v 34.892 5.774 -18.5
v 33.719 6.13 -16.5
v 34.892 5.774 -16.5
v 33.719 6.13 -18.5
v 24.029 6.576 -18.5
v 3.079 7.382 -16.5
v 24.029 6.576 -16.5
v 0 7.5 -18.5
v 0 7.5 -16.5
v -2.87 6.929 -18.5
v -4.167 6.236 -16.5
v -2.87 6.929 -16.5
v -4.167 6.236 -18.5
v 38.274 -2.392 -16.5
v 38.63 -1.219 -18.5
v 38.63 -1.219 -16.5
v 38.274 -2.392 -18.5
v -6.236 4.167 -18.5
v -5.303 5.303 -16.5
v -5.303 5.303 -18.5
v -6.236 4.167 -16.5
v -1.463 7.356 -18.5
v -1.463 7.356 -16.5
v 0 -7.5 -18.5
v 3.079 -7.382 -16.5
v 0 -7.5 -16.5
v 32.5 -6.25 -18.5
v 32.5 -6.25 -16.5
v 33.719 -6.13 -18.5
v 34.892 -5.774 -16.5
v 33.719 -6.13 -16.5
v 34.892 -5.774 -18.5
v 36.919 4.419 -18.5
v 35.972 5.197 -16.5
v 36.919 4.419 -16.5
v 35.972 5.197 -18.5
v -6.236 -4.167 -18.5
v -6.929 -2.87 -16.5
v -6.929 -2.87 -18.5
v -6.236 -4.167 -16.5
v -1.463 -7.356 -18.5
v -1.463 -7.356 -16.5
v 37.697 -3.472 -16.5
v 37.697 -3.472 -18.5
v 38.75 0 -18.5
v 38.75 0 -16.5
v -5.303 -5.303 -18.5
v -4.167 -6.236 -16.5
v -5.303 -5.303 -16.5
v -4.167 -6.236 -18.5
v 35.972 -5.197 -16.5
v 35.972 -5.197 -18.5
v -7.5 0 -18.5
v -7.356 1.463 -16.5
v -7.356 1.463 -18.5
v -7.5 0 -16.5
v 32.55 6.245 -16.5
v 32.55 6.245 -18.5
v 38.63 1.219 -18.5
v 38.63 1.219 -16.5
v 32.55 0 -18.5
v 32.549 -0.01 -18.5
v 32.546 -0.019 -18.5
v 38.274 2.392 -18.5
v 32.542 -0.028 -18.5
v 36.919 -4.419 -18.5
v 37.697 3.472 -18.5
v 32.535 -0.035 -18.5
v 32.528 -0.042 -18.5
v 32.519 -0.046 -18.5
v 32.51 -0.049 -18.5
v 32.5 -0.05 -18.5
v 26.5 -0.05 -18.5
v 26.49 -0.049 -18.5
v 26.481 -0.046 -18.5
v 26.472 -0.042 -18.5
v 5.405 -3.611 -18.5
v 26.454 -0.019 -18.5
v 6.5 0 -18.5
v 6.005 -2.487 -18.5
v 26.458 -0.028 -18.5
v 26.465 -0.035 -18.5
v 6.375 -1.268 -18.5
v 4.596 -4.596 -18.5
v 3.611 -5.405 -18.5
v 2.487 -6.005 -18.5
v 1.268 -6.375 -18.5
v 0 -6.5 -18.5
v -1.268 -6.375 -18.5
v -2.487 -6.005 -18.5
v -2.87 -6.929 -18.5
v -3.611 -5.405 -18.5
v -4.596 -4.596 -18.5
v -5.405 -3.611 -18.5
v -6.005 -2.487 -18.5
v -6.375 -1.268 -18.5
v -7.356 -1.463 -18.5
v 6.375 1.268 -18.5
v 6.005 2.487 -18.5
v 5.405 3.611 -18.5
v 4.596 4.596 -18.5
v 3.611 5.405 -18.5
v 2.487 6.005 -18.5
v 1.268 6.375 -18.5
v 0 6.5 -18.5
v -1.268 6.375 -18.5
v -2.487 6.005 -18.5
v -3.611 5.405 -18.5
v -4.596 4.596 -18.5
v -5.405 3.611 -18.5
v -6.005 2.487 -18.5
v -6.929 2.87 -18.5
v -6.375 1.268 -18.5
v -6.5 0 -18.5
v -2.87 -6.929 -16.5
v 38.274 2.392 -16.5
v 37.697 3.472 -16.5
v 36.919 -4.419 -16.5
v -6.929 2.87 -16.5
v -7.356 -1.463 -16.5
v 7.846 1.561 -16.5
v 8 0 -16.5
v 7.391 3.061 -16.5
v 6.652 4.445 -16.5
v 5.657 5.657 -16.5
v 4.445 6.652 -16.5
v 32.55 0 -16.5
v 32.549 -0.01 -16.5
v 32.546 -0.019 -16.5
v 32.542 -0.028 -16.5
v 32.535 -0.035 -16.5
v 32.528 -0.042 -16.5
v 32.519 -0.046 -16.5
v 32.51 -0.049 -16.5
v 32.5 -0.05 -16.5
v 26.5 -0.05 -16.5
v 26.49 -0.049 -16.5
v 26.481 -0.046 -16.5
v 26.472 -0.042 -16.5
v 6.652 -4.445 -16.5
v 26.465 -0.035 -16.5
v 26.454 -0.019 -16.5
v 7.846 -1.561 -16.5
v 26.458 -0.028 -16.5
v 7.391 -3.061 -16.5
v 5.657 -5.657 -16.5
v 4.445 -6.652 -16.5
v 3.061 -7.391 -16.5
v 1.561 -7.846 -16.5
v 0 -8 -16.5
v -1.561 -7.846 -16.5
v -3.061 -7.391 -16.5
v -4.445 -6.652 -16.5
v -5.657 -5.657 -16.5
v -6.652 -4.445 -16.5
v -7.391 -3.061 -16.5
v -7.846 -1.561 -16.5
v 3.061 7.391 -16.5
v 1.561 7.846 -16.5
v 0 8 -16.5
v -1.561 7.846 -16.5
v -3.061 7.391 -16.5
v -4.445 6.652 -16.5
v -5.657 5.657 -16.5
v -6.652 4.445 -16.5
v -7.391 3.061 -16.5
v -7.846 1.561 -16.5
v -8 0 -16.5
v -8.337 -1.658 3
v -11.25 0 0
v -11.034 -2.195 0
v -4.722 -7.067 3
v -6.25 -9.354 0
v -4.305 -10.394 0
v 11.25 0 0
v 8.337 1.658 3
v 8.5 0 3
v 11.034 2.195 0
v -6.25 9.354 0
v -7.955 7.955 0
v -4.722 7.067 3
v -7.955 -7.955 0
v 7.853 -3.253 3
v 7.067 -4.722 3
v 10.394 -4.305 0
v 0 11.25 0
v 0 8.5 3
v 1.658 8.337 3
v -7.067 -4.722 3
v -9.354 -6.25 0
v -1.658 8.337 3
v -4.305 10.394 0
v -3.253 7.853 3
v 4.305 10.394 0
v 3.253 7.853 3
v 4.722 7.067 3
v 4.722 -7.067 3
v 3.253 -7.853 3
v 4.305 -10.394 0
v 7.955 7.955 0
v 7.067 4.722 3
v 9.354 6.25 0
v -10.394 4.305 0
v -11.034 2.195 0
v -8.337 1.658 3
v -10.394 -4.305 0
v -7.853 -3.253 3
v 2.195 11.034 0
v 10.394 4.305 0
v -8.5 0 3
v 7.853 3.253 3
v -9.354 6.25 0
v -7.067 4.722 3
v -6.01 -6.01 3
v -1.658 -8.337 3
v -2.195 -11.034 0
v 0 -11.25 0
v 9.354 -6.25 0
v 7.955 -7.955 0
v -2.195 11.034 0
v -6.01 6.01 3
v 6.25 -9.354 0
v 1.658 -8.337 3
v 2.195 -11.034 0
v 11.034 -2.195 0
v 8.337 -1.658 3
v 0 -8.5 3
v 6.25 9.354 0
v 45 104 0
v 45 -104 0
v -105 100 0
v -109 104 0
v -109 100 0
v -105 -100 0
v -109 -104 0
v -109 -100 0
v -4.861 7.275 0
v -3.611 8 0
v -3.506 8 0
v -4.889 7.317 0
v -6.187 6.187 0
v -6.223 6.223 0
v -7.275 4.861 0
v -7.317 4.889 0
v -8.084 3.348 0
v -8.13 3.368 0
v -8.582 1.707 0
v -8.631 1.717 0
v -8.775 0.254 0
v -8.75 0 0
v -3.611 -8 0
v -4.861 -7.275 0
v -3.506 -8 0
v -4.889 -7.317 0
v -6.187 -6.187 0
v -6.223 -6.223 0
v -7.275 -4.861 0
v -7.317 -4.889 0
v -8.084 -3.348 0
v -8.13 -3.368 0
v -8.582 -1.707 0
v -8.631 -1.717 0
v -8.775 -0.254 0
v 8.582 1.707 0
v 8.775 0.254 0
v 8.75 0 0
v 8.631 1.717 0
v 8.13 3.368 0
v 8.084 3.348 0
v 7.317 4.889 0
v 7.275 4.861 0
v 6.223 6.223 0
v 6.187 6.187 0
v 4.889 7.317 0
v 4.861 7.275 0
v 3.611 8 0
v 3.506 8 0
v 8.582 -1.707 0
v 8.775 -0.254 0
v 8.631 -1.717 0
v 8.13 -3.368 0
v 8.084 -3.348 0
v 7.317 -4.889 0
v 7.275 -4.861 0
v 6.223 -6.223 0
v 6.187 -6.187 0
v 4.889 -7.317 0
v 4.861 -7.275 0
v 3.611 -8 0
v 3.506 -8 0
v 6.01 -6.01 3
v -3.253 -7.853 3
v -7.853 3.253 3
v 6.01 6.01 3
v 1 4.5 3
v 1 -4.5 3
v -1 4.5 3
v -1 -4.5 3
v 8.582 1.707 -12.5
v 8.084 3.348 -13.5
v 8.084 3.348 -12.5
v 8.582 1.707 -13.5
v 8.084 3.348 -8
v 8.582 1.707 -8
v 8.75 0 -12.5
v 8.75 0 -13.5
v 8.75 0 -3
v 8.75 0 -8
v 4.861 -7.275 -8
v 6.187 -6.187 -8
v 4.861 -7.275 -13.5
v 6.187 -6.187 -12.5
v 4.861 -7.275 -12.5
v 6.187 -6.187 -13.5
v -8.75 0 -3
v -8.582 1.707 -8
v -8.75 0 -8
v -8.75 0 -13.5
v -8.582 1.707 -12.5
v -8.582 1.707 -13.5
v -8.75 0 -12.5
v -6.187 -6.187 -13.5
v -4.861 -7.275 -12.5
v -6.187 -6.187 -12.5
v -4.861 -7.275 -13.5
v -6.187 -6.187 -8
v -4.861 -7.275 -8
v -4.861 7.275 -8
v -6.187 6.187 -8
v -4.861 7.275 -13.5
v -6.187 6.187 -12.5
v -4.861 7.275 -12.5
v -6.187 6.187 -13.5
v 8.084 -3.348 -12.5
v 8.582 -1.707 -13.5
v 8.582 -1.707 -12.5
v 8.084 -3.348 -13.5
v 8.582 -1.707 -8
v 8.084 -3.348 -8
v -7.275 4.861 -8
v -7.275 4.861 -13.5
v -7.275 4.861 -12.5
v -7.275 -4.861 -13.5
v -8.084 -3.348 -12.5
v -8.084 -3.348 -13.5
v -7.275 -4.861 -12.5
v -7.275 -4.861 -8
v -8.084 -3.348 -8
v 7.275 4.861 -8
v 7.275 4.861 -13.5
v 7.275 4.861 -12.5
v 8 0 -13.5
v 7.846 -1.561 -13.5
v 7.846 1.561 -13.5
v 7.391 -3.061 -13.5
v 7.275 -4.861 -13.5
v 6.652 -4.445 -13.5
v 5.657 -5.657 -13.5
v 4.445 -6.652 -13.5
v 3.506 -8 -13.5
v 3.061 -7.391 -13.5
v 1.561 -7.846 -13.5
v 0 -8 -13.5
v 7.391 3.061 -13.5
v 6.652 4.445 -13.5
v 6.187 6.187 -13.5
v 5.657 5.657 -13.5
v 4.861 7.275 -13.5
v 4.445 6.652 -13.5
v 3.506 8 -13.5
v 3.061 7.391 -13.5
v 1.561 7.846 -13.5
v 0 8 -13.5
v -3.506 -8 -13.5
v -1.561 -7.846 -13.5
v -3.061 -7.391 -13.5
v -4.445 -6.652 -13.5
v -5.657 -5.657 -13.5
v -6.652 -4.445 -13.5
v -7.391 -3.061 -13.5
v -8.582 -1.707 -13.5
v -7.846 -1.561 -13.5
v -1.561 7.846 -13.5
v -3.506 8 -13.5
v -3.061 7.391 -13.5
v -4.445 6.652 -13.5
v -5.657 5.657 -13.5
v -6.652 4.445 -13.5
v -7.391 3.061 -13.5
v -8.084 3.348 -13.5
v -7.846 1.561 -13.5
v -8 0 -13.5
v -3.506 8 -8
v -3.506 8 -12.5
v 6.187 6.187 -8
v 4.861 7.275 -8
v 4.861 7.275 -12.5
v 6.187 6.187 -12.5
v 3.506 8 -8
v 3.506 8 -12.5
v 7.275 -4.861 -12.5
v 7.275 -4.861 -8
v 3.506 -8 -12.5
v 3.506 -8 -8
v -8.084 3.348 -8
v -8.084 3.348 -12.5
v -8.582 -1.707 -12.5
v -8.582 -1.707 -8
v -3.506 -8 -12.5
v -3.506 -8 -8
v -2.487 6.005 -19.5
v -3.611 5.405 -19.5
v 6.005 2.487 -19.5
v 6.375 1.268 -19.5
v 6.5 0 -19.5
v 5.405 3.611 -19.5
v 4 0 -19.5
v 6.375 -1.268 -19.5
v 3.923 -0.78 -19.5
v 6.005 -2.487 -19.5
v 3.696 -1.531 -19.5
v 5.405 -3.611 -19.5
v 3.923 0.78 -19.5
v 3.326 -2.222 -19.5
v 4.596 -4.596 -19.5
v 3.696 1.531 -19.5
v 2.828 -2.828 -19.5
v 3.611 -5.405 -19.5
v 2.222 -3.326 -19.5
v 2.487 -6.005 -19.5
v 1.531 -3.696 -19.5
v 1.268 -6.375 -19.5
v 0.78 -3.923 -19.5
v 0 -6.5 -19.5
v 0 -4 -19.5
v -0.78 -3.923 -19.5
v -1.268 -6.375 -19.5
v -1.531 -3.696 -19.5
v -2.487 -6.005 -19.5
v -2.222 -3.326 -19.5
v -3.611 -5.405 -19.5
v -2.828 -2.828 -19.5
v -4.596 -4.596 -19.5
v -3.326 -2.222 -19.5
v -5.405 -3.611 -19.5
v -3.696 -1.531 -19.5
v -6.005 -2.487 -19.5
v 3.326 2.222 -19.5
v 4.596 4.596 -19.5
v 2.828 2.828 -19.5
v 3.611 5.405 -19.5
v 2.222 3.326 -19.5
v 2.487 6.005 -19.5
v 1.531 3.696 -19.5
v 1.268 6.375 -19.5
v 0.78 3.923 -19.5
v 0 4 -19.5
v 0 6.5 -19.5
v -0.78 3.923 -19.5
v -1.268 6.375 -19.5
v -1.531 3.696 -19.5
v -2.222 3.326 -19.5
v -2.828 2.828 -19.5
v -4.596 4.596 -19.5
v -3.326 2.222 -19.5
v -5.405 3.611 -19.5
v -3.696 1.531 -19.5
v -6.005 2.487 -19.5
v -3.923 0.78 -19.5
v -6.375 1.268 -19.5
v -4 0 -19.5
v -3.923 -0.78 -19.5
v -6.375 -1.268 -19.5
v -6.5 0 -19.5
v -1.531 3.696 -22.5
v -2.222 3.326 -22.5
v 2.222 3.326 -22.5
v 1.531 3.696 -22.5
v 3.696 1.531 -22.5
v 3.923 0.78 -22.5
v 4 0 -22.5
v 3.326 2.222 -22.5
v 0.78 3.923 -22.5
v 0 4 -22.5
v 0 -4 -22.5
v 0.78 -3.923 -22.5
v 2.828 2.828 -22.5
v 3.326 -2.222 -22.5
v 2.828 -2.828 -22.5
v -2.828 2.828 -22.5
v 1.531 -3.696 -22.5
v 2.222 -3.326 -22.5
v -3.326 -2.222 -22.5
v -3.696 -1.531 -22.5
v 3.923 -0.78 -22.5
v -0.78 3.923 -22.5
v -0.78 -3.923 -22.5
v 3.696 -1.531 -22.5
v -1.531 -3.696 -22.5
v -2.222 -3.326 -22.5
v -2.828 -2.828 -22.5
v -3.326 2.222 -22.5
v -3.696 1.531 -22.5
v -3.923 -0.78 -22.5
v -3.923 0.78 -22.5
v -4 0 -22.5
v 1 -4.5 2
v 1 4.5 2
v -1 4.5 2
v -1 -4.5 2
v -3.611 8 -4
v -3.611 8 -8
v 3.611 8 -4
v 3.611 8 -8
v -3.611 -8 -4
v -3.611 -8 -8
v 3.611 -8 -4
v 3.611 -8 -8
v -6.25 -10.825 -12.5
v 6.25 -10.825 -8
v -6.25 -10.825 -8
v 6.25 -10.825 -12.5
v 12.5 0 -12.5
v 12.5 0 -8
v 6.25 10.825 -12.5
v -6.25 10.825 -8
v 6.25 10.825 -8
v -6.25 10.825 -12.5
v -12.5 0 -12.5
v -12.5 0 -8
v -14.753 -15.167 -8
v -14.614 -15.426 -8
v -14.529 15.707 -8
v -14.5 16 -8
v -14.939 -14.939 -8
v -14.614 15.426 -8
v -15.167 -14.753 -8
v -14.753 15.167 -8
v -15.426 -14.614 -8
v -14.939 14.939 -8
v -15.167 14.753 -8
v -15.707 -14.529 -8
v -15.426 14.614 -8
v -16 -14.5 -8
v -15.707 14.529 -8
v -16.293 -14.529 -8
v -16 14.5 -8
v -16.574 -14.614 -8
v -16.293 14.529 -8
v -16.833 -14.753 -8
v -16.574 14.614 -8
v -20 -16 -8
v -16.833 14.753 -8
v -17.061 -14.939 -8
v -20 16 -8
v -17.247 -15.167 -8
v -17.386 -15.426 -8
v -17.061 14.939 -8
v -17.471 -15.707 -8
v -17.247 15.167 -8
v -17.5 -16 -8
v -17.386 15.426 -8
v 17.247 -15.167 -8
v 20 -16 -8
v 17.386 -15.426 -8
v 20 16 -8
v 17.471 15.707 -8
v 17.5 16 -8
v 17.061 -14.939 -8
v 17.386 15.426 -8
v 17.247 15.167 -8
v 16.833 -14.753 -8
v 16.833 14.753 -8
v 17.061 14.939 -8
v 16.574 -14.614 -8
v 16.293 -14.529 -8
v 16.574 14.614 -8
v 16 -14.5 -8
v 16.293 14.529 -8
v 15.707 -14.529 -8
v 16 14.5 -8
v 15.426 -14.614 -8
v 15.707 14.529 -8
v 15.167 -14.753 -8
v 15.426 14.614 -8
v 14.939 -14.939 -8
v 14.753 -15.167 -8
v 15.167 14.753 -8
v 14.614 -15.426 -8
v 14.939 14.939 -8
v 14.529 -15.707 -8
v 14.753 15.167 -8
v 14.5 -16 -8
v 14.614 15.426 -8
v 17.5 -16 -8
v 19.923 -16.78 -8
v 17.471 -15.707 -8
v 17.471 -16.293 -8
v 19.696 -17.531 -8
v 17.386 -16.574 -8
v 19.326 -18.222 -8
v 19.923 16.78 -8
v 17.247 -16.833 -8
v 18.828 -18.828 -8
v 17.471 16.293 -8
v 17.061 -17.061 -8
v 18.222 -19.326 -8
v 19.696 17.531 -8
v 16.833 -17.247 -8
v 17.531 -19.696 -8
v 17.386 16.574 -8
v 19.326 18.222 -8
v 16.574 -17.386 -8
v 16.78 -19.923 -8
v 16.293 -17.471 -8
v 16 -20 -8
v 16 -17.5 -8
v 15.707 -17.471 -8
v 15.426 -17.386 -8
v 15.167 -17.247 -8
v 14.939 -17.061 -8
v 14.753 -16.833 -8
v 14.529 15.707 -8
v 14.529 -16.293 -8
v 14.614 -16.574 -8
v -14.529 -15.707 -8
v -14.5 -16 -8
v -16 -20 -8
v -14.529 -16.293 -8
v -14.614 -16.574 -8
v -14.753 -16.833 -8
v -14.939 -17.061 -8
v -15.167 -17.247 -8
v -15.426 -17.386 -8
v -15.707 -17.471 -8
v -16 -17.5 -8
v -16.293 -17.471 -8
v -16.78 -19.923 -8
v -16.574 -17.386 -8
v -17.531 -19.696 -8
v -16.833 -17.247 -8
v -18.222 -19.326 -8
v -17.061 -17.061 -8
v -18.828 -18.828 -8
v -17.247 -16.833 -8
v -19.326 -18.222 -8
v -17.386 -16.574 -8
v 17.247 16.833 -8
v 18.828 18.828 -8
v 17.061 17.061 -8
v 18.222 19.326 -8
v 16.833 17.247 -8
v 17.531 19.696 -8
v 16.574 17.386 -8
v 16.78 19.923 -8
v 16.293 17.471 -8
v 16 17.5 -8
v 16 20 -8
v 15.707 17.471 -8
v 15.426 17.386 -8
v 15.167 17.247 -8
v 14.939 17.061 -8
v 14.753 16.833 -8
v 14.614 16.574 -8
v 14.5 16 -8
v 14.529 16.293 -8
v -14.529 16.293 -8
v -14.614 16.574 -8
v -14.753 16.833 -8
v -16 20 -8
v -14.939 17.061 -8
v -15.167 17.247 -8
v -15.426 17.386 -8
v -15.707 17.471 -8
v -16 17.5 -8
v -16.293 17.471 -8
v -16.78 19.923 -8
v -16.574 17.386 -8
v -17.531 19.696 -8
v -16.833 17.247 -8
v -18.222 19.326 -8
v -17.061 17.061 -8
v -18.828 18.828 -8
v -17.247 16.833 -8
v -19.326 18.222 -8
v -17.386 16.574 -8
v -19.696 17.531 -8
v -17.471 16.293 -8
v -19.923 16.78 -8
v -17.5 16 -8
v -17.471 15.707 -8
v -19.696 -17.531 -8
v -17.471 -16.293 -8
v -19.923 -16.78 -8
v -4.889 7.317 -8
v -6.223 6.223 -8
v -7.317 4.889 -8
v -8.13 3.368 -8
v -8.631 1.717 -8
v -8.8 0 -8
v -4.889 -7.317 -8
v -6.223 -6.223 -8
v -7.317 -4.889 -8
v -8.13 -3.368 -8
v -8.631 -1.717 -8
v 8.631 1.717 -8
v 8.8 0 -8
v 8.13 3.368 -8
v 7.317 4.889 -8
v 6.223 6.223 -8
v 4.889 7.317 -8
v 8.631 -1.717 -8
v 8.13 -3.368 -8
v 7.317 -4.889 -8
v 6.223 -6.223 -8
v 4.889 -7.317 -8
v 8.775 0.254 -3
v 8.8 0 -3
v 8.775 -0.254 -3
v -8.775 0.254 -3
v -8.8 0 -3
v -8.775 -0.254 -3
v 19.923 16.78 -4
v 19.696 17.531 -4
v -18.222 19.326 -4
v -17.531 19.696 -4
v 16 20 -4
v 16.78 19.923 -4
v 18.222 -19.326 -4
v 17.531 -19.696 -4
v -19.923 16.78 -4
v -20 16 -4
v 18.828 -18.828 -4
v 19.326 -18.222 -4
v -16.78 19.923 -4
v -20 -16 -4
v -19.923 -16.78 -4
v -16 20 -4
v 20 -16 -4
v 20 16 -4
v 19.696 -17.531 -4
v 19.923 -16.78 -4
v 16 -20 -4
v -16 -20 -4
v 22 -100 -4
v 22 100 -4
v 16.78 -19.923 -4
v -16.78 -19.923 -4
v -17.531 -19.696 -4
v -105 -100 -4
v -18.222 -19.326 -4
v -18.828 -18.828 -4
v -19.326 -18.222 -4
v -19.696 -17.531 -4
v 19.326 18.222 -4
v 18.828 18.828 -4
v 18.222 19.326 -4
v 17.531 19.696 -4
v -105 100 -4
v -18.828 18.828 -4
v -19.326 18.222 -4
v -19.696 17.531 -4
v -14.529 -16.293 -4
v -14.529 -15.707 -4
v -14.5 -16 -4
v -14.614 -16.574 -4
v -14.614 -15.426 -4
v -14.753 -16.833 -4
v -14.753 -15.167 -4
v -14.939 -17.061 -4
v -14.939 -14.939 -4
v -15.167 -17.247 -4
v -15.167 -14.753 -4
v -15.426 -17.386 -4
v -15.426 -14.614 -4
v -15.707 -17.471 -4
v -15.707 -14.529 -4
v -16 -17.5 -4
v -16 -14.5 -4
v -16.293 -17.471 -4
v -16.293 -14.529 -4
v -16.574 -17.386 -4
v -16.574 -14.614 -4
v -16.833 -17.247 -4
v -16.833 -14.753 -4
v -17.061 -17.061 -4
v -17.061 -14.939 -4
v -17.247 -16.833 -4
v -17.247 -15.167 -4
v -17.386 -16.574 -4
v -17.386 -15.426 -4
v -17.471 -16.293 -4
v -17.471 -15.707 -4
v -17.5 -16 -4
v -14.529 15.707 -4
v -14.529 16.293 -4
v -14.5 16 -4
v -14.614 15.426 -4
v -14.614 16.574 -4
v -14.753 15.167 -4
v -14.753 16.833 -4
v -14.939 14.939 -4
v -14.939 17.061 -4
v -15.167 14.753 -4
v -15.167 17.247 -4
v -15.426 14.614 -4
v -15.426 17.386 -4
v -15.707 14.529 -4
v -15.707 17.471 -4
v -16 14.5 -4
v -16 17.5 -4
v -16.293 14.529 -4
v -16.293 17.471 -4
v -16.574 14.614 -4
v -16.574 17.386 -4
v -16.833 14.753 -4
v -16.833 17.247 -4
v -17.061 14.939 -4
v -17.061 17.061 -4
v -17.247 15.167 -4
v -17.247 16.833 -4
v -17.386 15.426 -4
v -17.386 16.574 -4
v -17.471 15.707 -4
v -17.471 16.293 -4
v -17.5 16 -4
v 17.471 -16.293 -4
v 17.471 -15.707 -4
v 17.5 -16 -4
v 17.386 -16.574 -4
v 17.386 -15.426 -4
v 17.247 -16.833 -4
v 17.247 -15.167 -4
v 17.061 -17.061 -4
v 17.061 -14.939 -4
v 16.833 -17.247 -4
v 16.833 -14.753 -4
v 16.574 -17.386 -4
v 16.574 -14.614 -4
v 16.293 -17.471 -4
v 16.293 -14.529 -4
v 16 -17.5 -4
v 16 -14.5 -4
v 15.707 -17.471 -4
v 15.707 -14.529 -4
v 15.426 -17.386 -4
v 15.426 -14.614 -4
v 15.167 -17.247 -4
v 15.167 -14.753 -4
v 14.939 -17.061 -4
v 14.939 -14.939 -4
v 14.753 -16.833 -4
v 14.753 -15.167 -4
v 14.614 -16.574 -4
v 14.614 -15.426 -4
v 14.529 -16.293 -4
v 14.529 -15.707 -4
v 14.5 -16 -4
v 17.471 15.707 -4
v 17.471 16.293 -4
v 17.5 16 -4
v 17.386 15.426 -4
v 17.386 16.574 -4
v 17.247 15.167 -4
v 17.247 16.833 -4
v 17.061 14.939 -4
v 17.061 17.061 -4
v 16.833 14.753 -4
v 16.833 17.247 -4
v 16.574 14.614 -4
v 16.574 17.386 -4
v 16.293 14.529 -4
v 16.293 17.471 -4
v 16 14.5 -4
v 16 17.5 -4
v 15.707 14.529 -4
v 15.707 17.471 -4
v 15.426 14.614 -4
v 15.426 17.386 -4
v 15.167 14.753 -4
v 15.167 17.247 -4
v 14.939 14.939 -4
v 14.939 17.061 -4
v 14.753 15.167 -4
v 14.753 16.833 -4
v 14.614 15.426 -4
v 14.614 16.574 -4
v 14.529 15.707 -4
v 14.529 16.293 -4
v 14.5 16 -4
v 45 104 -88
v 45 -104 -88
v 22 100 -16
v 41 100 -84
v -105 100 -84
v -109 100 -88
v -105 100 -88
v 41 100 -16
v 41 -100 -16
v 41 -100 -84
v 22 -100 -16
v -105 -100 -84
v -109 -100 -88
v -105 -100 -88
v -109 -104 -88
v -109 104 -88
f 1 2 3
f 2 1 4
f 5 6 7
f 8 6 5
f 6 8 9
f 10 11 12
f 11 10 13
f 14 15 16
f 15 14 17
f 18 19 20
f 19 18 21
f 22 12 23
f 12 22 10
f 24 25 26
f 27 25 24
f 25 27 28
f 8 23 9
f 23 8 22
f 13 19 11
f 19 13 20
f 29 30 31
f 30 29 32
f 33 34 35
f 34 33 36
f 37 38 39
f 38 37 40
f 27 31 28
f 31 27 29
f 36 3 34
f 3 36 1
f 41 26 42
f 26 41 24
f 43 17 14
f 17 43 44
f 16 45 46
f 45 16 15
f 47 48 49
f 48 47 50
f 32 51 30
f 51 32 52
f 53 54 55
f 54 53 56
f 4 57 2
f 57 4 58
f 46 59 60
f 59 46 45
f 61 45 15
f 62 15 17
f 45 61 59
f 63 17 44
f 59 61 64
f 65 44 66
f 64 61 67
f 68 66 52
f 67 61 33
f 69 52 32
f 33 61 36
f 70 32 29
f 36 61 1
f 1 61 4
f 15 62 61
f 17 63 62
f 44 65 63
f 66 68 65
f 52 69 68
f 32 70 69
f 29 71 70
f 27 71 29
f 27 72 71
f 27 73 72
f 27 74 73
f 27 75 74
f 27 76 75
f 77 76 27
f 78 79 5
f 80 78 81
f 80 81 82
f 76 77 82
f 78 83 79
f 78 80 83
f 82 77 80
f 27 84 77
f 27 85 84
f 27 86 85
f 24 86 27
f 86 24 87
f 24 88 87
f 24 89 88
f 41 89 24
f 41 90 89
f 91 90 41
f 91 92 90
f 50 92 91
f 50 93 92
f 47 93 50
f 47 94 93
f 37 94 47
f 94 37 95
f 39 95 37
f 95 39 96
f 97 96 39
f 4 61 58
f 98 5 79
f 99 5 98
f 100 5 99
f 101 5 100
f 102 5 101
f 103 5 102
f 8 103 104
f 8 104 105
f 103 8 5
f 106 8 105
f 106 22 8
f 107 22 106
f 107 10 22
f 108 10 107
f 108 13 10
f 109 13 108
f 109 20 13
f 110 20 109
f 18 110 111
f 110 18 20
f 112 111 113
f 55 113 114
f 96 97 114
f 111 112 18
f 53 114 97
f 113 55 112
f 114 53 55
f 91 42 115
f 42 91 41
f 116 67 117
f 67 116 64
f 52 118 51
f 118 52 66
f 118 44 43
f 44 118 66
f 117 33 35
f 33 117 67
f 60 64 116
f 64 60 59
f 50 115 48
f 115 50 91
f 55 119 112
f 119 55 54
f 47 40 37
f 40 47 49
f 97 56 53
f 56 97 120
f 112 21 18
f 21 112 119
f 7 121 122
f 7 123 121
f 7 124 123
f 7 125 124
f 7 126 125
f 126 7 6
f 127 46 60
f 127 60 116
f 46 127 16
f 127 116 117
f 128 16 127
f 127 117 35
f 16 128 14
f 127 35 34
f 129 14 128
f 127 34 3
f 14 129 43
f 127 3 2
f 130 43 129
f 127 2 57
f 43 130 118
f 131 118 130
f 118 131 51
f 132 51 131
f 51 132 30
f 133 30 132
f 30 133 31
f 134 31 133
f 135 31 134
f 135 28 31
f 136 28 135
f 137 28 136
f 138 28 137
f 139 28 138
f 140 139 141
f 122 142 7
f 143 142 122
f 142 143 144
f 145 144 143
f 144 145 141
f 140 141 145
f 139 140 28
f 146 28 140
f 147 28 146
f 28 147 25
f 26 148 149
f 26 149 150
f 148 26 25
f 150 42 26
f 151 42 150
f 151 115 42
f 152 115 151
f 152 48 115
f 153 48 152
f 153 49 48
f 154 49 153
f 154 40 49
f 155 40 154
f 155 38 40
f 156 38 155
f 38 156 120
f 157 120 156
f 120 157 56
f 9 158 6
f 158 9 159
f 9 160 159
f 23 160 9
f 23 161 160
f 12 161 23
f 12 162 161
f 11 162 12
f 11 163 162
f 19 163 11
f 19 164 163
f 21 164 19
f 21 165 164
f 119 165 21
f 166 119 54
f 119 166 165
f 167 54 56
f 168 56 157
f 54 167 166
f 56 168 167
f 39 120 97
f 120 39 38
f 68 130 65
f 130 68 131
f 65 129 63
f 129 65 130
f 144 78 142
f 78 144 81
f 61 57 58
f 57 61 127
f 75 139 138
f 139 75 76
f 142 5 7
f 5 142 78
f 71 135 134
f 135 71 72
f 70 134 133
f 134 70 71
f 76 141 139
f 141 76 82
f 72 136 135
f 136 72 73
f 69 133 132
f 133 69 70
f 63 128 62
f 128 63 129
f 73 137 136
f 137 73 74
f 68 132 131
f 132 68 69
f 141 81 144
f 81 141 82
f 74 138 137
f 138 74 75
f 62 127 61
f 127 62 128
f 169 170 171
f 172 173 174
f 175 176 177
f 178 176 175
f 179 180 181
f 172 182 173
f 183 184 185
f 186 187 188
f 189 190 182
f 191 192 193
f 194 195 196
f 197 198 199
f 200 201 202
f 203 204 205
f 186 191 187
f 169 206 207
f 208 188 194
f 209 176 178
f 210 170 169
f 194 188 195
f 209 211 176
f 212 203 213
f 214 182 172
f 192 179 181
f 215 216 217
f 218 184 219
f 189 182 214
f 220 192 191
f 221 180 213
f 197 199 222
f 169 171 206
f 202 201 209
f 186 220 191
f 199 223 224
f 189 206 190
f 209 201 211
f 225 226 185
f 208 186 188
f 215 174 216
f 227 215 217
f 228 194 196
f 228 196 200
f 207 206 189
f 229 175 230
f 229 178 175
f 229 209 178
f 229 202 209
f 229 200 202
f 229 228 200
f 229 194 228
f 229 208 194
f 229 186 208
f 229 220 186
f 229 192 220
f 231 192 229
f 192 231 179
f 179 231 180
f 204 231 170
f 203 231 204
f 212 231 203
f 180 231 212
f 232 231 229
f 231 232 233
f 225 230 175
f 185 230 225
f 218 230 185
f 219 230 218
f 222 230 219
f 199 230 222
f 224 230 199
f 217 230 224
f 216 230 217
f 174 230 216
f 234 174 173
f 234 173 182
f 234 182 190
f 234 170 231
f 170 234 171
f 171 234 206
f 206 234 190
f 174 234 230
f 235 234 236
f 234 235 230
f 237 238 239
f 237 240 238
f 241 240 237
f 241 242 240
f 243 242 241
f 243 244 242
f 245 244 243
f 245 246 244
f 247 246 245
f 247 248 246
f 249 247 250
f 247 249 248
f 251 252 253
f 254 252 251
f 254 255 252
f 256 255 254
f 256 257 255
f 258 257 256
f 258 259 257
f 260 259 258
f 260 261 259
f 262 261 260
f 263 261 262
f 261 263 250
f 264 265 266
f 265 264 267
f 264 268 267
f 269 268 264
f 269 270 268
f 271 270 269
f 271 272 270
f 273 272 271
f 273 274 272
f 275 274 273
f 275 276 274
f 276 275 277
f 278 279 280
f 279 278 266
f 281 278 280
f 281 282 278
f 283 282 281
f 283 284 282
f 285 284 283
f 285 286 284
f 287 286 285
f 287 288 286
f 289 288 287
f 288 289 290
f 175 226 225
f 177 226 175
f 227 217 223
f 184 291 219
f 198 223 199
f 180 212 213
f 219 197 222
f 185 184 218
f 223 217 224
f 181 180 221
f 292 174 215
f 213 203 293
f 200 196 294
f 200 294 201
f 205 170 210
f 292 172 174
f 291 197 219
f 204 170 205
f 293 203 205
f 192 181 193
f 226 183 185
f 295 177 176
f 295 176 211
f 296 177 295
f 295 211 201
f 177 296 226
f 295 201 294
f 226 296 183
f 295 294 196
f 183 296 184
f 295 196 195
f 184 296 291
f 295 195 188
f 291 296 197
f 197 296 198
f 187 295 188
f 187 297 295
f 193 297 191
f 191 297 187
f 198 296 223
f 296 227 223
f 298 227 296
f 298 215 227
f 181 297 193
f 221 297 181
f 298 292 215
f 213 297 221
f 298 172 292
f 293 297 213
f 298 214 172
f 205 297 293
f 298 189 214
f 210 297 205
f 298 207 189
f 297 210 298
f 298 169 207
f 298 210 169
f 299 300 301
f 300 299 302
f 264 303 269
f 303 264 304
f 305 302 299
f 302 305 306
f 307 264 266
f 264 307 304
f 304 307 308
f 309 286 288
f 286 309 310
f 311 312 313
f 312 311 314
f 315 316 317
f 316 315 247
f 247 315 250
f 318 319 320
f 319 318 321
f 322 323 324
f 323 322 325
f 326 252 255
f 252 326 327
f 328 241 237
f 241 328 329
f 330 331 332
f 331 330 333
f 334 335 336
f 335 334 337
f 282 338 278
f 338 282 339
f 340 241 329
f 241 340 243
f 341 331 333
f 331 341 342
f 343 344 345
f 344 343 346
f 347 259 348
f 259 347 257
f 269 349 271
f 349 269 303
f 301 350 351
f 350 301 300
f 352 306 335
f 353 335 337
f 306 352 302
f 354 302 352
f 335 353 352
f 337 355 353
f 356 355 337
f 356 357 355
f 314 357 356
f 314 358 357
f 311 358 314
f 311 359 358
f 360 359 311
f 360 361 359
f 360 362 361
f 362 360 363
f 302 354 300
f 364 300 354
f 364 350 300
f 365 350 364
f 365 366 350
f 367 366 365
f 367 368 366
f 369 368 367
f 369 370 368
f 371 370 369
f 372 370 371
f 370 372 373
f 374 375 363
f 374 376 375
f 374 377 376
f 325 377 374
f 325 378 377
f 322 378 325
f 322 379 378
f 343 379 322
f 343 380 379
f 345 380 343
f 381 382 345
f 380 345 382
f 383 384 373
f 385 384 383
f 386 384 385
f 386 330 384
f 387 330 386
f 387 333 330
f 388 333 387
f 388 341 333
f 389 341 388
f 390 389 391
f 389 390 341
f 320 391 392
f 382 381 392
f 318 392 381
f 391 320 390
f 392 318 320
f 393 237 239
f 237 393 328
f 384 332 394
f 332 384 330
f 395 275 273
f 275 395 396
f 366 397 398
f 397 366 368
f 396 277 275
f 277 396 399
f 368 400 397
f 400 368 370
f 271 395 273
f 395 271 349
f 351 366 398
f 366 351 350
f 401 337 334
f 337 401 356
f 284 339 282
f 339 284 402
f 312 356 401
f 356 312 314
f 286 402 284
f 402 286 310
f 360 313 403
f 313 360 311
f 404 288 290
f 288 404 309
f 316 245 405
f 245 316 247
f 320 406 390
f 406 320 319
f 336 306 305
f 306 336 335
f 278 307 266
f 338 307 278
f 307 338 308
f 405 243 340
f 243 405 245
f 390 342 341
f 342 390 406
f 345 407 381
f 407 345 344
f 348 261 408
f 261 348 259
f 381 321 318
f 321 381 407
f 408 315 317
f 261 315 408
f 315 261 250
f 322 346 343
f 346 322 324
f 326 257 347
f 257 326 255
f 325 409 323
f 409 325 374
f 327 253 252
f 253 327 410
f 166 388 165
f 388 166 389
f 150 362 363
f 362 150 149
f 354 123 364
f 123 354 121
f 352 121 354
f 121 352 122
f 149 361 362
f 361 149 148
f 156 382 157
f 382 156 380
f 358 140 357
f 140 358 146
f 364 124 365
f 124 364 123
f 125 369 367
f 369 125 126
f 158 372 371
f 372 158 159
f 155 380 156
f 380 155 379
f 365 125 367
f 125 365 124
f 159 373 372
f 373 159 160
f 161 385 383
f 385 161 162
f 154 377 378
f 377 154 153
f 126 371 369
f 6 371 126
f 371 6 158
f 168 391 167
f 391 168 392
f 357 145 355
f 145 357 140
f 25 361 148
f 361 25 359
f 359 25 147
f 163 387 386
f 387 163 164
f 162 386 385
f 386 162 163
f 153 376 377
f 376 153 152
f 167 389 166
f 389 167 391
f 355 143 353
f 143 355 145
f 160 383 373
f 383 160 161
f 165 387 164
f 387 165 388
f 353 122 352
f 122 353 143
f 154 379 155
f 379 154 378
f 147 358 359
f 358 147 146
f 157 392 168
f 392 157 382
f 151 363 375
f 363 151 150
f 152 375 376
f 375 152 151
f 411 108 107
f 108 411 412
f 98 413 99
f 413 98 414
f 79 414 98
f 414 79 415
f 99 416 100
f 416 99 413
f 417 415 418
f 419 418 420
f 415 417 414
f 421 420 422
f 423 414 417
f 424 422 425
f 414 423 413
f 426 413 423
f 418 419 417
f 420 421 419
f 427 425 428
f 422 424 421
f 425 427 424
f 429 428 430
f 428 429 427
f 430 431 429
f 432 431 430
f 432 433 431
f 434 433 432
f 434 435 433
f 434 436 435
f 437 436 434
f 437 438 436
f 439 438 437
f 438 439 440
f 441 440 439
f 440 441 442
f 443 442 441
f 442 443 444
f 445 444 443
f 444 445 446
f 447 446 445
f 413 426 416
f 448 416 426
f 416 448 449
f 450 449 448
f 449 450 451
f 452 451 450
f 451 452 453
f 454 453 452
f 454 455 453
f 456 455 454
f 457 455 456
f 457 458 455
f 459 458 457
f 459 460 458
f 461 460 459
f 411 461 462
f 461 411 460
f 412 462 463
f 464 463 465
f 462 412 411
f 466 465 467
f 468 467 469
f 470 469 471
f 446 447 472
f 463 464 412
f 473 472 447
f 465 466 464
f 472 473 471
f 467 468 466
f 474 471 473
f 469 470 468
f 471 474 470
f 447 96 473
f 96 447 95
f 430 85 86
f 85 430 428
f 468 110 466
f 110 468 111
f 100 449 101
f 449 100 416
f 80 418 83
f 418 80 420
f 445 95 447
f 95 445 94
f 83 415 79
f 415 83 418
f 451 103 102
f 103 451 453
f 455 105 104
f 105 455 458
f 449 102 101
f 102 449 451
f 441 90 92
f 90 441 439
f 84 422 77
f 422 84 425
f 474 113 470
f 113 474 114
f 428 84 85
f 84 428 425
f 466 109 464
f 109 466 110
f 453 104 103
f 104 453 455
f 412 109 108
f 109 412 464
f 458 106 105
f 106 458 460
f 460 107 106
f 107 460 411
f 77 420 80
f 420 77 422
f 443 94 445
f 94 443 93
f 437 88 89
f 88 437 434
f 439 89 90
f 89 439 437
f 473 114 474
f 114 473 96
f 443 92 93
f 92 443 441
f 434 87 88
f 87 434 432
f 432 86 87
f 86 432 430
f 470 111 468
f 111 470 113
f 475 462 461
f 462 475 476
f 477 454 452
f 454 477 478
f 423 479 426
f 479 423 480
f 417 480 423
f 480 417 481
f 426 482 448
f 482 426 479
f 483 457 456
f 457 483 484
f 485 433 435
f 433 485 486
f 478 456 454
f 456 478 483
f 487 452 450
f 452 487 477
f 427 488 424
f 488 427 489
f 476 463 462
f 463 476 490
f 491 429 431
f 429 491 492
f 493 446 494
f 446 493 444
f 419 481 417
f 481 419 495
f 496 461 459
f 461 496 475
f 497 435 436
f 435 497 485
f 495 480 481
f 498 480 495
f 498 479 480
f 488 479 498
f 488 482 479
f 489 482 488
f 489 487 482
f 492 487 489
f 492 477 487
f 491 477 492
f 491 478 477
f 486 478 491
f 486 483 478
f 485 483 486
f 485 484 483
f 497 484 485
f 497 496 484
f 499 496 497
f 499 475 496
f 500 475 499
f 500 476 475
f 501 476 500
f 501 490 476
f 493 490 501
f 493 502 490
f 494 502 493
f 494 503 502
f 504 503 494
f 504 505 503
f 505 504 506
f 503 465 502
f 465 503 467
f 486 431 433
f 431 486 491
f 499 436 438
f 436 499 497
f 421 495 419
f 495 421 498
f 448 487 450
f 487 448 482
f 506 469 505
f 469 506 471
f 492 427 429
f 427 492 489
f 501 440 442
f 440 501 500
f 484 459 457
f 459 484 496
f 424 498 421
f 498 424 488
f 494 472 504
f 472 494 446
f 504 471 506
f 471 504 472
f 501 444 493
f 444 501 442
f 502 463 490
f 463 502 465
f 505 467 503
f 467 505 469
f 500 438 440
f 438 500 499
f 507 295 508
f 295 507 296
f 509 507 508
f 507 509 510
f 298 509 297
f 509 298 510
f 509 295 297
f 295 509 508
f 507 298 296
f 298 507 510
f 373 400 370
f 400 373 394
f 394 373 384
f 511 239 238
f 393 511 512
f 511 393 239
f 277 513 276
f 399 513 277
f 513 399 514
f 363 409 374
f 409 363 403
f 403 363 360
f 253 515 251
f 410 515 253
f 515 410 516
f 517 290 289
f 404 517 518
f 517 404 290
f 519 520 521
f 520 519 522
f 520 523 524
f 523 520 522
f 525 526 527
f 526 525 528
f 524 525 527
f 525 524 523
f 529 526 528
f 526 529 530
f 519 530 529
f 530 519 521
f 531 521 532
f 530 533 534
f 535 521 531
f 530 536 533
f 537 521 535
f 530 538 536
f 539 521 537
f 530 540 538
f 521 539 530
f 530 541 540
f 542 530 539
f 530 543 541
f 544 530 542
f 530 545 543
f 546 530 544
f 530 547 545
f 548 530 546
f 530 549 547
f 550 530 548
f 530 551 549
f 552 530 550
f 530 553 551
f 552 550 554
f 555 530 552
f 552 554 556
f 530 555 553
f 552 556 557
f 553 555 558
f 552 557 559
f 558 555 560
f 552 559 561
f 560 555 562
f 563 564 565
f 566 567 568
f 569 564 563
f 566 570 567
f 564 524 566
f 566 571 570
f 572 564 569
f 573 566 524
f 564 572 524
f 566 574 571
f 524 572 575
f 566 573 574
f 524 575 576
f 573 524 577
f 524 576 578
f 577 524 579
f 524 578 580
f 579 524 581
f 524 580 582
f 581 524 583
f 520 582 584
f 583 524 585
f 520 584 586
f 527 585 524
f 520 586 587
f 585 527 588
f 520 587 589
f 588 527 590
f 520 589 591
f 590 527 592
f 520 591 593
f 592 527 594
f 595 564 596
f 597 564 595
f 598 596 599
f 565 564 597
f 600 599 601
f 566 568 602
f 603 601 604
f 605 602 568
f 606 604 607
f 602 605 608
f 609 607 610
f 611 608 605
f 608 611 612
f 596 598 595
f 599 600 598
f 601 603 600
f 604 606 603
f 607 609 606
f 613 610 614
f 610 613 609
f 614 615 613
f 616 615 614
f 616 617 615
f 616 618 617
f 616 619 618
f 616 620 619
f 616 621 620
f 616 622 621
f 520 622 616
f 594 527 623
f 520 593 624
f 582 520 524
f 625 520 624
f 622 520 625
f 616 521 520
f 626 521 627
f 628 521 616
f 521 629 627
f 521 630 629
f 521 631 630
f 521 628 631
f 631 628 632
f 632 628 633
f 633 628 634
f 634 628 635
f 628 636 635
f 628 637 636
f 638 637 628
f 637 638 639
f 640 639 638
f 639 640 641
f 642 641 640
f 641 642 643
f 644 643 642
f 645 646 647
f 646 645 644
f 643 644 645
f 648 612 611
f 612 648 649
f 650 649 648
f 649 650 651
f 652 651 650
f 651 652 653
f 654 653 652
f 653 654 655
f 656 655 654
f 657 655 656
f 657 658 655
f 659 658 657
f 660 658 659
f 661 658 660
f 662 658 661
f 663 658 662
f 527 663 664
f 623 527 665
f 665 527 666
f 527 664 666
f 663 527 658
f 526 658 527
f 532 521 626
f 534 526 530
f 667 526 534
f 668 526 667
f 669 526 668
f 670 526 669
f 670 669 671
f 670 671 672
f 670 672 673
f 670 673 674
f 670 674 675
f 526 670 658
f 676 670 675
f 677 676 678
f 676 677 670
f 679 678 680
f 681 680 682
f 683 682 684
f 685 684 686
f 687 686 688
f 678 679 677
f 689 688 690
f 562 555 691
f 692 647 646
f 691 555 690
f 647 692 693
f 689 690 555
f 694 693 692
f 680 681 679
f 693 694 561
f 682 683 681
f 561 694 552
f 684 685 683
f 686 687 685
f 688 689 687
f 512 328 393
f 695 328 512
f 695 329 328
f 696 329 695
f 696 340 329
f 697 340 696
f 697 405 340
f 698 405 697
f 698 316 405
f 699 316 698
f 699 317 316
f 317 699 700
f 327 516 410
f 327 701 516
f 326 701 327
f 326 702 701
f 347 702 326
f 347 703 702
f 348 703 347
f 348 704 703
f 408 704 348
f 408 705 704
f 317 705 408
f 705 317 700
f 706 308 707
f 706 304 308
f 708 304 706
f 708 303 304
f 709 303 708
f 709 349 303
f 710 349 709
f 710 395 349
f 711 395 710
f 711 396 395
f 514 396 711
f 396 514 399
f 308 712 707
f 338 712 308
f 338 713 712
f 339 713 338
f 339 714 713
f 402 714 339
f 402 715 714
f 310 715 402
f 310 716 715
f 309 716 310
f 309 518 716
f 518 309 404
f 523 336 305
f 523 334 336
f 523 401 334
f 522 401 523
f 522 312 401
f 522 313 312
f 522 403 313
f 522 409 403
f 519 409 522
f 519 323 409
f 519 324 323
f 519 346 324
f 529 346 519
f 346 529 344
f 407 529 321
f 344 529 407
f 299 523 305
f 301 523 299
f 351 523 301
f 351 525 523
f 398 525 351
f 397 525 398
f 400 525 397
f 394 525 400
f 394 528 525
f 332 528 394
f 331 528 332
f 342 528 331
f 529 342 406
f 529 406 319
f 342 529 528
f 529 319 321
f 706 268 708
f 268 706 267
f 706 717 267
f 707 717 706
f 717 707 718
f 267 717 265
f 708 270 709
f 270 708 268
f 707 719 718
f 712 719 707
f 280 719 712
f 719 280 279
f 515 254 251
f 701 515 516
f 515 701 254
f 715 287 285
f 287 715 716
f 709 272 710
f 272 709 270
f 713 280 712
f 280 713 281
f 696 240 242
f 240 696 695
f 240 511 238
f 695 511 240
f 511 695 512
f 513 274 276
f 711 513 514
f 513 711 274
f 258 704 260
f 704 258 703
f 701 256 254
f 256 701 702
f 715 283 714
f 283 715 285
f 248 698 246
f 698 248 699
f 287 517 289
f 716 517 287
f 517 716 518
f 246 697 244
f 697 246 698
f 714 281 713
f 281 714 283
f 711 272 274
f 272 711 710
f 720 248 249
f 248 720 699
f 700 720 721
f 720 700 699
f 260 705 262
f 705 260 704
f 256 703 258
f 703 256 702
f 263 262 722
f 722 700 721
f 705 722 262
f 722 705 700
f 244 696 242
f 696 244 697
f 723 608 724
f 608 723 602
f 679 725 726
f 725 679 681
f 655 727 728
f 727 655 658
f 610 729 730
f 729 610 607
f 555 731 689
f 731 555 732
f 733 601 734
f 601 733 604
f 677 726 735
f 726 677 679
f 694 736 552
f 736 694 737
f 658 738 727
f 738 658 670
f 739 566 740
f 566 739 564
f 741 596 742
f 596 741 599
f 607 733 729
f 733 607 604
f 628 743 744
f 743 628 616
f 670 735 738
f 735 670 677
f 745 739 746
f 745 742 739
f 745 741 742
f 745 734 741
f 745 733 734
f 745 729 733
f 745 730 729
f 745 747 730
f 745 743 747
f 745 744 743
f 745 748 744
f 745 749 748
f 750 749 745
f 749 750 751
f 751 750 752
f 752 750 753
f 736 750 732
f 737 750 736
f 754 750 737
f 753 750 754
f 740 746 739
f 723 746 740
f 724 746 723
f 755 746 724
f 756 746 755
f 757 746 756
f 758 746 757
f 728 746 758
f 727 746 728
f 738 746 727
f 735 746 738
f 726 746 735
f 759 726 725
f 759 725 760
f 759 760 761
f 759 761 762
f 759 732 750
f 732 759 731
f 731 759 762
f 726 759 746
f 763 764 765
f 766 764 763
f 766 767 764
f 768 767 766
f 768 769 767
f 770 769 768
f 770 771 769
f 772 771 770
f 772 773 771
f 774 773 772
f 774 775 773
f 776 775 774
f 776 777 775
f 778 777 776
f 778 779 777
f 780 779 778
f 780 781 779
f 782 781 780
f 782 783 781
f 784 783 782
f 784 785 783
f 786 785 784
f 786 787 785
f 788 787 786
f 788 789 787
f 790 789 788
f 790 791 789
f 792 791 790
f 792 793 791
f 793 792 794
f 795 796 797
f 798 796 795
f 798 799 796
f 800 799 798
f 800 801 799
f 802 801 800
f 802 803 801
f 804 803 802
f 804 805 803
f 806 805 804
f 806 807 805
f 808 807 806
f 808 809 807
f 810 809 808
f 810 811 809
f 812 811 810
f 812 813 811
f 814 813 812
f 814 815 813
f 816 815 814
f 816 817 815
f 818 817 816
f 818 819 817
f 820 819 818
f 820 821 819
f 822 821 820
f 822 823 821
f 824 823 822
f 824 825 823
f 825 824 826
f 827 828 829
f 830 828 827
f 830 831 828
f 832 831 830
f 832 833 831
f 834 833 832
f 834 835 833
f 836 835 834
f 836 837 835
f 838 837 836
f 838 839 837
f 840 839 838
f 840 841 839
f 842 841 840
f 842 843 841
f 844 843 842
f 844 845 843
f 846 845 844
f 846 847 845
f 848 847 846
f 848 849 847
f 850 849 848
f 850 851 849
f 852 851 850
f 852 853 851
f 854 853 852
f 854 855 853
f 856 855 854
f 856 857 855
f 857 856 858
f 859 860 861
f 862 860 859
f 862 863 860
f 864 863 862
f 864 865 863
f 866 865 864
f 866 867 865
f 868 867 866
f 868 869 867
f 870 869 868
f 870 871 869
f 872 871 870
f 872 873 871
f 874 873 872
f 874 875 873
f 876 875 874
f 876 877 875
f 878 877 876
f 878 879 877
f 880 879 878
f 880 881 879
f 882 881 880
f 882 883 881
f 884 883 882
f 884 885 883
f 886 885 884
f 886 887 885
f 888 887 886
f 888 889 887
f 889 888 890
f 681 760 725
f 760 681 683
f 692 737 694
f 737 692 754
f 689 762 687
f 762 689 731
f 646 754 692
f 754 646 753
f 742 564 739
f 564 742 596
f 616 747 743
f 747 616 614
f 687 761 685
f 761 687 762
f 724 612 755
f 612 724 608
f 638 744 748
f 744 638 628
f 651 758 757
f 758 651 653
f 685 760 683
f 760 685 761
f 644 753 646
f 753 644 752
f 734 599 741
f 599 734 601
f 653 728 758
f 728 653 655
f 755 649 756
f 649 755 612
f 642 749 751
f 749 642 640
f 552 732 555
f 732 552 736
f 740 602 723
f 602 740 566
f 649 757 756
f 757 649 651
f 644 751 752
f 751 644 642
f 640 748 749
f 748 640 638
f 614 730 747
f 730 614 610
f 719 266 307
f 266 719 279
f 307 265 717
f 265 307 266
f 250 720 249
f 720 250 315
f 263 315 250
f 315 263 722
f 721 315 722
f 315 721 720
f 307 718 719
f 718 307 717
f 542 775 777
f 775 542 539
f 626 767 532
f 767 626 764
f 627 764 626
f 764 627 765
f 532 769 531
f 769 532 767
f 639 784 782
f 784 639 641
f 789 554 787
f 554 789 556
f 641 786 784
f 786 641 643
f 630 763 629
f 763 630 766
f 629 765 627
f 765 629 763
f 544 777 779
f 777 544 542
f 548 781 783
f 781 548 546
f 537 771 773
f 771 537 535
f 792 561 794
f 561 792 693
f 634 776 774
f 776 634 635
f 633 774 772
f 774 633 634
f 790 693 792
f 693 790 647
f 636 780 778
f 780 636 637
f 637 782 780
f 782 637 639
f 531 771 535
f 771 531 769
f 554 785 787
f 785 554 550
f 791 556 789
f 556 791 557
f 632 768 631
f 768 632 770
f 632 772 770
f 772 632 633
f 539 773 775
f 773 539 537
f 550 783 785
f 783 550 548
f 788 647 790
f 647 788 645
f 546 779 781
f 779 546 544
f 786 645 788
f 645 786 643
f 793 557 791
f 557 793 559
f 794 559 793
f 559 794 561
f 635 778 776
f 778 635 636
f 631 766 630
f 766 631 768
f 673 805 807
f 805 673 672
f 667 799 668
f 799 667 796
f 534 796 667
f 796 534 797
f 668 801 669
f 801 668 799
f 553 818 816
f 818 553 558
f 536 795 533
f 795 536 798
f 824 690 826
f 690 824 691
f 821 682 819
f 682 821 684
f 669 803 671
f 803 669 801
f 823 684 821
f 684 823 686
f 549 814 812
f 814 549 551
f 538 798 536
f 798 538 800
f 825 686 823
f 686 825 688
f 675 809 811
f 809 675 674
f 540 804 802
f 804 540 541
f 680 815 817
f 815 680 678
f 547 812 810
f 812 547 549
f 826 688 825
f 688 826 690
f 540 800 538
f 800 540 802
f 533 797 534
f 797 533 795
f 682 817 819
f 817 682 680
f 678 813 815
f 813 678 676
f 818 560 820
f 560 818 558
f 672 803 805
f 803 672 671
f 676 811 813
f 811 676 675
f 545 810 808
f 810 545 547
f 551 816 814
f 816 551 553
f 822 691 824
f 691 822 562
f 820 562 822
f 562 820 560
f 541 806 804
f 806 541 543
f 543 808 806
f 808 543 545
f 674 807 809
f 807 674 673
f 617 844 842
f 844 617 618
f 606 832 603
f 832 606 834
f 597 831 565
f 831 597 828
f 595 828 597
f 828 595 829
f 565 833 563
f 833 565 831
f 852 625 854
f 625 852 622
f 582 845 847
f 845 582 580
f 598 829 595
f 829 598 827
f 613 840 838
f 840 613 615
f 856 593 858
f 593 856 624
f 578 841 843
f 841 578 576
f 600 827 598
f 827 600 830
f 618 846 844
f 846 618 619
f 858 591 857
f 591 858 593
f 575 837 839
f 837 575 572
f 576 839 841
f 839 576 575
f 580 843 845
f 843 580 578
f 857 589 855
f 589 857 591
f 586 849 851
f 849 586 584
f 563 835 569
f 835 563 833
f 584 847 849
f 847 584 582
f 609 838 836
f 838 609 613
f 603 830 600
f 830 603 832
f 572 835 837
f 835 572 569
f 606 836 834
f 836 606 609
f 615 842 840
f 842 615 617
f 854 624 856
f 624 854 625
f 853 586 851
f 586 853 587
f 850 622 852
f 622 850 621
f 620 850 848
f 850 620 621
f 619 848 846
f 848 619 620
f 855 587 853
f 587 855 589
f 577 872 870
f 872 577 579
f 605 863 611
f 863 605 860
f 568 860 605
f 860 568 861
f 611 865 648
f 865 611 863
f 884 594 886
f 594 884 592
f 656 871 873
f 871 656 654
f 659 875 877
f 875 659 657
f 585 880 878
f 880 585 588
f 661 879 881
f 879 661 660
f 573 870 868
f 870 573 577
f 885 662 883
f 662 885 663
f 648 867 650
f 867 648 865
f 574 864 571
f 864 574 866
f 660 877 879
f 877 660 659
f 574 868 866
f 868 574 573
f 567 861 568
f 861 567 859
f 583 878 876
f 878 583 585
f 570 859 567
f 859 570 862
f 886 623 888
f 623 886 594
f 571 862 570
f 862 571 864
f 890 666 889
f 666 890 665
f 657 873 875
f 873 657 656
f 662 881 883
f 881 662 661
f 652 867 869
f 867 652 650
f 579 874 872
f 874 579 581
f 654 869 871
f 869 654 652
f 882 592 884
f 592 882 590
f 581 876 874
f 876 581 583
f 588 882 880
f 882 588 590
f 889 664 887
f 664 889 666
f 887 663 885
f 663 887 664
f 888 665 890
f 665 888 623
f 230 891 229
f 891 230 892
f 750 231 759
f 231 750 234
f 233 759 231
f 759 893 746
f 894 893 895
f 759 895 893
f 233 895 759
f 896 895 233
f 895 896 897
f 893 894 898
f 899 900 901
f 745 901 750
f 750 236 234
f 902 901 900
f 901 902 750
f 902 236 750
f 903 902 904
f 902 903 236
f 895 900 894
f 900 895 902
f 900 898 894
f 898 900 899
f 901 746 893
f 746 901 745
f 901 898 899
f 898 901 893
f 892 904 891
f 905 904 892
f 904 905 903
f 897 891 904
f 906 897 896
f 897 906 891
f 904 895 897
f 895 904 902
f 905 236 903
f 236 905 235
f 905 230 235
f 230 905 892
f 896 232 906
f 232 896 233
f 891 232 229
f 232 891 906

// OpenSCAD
/**
 * Martin Egli
 * 2024-10-20
 */

module lock(col = "Silver", loc_res = 32) {
    color(col) {
        difference() {
            union() {
                translate([0, 0, 0])
                cylinder(d1 = 22.5, d2 = 17, h = 3, $fn = loc_res);
                translate([0, 0, -13.5])
                cylinder(d = 17.5, h = 13.5, $fn = loc_res);
                translate([0, 0, -16.5])
                cylinder(d = 16, h = 16.5, $fn = loc_res);
                translate([0, 0, -(16.5+2)])
                difference() {
                    hull() {
                        translate([0, 0, 0])
                        cylinder(d = 15, h = 2, $fn = loc_res);
                        translate([32.5, 0, 0])
                        cylinder(d = 12.5, h = 2, $fn = loc_res);
                    }
                    hull() {
                        translate([32.5, 0, -0.5])
                        cylinder(d = 0.1, h = 2+1, $fn = loc_res);
                        translate([32.5, 6.8, -0.5])
                        cylinder(d = 0.1, h = 2+1, $fn = loc_res);
                        translate([32.5-8.5, 6.8, -0.5])
                        cylinder(d = 0.1, h = 2+1, $fn = loc_res);
                        translate([32.5-6.0, 0, -0.5])
                        cylinder(d = 0.1, h = 2+1, $fn = loc_res);
                    }
                    
                }
                translate([0, 0, -(16.5+2+1)])
                cylinder(d = 13, h = 1, $fn = loc_res);
                translate([0, 0, -(16.5+2+1+3)])
                cylinder(d = 8, h = 3, $fn = loc_res);
            }
            //  cuts
            translate([-2/2, -9/2, 3-1])
            cube([2, 9, 2]);
            translate([-20/2, 16/2, -16.6])
            cube([20, 2, 16.6]);
            translate([-20/2, -(16/2+2), -16.6])
            cube([20, 2, 16.6]);
        }
        // M22 nut
        translate([0, 0, -(8+4.5)])
        cylinder(d = 25, h = 4.5, $fn = 6);
    }
}
//lock();

module lock_cut(loc_res = 32) {
    difference() {
        union() {
            translate([0, 0, -16])
            cylinder(d = 17.6, h = 16, $fn = loc_res);
        }
        translate([-20/2, 16/2, -16.6])
        cube([20, 2, 16.6]);
        translate([-20/2, -(16/2+2), -16.6])
        cube([20, 2, 16.6]);
    }
}
//lock_cut();

module lock_mounting_plate(col = "Blue", loc_res = 32) {
    color(col)
    difference() {
        union() {
            hull() {
                translate([-16, -16, -4])
                cylinder(d = 8, h = 4, $fn = loc_res);
                translate([-16, +16, -4])
                cylinder(d = 8, h = 4, $fn = loc_res);
                translate([+16, -16, -4])
                cylinder(d = 8, h = 4, $fn = loc_res);
                translate([+16, +16, -4])
                cylinder(d = 8, h = 4, $fn = loc_res);
            }
            translate([+(17.5/2+6/2), 0, -4])
            cylinder(d = 6, h = 8, $fn = loc_res);
            translate([-(17.5/2+6/2), 0, -4])
            cylinder(d = 6, h = 8, $fn = loc_res);
        }
        // lock cut
        translate([0, 0, 1])
        lock_cut();
        // screw czts
        translate([-16, -16, -5])
        cylinder(d = 3, h = 6, $fn = loc_res);
        translate([-16, +16, -5])
        cylinder(d = 3, h = 6, $fn = loc_res);
        translate([+16, -16, -5])
        cylinder(d = 3, h = 6, $fn = loc_res);
        translate([+16, +16, -5])
        cylinder(d = 3, h = 6, $fn = loc_res);
    }
}
*translate([0, 0, -4])
lock_mounting_plate();
//lock();

module box_lid(col = "LightGreen", loc_res = 32) {
    difference() {
        color(col)
        // 1 x 200 x 150 x 4 mm 
        translate([-(150-45), -200/2, -4])
        cube([150, 200, 4]);
        
        translate([0, 0, 1])
        lock_cut();
    }
}

module box_front(col = "LightBlue", loc_res = 32) {
    color(col) {
        // 1 x 200 x 80 x 4 mm
        translate([45-4, -200/2, -84])
        cube([4, 200, 80]);
        
        // 3 x  200 x 19 x 4 mm
        translate([45-23, -200/2, -2*4])
        cube([19, 200, 4]);
        translate([45-23, -200/2, -3*4])
        cube([19, 200, 4]);
        translate([45-23, -200/2, -4*4])
        cube([19, 200, 4]);
    }
}

module box_bottom(col = "RoyalBlue", loc_res = 32) {
    color(col)
    // 1 x 200 x 150 x 4 mm 
    translate([-(150-45), -200/2, -88])
    cube([150, 200, 4]);
}

module box_side1(col = "LightCoral", loc_res = 32) {
    color(col)
    // 1 x 154 x 88 x 4 mm
    translate([-150+(45-4), -(200/2+4), -88])
    cube([154, 4, 88]);
}
module box_side2(col = "LightCoral", loc_res = 32) {
    color(col)
    // 1 x 154 x 88 x 4 mm
    translate([-150+(45-4), +(200/2), -88])
    cube([154, 4, 88]);
}

module box(show_compoments = 1, loc_res = 32) {
    if(show_compoments) {
        translate([0, 0, 0])
        lock();
        translate([0, 0, -4])
        lock_mounting_plate();
    }
    box_lid();
    box_front();
    box_bottom();
    box_side1();
    box_side2();
}

box();
